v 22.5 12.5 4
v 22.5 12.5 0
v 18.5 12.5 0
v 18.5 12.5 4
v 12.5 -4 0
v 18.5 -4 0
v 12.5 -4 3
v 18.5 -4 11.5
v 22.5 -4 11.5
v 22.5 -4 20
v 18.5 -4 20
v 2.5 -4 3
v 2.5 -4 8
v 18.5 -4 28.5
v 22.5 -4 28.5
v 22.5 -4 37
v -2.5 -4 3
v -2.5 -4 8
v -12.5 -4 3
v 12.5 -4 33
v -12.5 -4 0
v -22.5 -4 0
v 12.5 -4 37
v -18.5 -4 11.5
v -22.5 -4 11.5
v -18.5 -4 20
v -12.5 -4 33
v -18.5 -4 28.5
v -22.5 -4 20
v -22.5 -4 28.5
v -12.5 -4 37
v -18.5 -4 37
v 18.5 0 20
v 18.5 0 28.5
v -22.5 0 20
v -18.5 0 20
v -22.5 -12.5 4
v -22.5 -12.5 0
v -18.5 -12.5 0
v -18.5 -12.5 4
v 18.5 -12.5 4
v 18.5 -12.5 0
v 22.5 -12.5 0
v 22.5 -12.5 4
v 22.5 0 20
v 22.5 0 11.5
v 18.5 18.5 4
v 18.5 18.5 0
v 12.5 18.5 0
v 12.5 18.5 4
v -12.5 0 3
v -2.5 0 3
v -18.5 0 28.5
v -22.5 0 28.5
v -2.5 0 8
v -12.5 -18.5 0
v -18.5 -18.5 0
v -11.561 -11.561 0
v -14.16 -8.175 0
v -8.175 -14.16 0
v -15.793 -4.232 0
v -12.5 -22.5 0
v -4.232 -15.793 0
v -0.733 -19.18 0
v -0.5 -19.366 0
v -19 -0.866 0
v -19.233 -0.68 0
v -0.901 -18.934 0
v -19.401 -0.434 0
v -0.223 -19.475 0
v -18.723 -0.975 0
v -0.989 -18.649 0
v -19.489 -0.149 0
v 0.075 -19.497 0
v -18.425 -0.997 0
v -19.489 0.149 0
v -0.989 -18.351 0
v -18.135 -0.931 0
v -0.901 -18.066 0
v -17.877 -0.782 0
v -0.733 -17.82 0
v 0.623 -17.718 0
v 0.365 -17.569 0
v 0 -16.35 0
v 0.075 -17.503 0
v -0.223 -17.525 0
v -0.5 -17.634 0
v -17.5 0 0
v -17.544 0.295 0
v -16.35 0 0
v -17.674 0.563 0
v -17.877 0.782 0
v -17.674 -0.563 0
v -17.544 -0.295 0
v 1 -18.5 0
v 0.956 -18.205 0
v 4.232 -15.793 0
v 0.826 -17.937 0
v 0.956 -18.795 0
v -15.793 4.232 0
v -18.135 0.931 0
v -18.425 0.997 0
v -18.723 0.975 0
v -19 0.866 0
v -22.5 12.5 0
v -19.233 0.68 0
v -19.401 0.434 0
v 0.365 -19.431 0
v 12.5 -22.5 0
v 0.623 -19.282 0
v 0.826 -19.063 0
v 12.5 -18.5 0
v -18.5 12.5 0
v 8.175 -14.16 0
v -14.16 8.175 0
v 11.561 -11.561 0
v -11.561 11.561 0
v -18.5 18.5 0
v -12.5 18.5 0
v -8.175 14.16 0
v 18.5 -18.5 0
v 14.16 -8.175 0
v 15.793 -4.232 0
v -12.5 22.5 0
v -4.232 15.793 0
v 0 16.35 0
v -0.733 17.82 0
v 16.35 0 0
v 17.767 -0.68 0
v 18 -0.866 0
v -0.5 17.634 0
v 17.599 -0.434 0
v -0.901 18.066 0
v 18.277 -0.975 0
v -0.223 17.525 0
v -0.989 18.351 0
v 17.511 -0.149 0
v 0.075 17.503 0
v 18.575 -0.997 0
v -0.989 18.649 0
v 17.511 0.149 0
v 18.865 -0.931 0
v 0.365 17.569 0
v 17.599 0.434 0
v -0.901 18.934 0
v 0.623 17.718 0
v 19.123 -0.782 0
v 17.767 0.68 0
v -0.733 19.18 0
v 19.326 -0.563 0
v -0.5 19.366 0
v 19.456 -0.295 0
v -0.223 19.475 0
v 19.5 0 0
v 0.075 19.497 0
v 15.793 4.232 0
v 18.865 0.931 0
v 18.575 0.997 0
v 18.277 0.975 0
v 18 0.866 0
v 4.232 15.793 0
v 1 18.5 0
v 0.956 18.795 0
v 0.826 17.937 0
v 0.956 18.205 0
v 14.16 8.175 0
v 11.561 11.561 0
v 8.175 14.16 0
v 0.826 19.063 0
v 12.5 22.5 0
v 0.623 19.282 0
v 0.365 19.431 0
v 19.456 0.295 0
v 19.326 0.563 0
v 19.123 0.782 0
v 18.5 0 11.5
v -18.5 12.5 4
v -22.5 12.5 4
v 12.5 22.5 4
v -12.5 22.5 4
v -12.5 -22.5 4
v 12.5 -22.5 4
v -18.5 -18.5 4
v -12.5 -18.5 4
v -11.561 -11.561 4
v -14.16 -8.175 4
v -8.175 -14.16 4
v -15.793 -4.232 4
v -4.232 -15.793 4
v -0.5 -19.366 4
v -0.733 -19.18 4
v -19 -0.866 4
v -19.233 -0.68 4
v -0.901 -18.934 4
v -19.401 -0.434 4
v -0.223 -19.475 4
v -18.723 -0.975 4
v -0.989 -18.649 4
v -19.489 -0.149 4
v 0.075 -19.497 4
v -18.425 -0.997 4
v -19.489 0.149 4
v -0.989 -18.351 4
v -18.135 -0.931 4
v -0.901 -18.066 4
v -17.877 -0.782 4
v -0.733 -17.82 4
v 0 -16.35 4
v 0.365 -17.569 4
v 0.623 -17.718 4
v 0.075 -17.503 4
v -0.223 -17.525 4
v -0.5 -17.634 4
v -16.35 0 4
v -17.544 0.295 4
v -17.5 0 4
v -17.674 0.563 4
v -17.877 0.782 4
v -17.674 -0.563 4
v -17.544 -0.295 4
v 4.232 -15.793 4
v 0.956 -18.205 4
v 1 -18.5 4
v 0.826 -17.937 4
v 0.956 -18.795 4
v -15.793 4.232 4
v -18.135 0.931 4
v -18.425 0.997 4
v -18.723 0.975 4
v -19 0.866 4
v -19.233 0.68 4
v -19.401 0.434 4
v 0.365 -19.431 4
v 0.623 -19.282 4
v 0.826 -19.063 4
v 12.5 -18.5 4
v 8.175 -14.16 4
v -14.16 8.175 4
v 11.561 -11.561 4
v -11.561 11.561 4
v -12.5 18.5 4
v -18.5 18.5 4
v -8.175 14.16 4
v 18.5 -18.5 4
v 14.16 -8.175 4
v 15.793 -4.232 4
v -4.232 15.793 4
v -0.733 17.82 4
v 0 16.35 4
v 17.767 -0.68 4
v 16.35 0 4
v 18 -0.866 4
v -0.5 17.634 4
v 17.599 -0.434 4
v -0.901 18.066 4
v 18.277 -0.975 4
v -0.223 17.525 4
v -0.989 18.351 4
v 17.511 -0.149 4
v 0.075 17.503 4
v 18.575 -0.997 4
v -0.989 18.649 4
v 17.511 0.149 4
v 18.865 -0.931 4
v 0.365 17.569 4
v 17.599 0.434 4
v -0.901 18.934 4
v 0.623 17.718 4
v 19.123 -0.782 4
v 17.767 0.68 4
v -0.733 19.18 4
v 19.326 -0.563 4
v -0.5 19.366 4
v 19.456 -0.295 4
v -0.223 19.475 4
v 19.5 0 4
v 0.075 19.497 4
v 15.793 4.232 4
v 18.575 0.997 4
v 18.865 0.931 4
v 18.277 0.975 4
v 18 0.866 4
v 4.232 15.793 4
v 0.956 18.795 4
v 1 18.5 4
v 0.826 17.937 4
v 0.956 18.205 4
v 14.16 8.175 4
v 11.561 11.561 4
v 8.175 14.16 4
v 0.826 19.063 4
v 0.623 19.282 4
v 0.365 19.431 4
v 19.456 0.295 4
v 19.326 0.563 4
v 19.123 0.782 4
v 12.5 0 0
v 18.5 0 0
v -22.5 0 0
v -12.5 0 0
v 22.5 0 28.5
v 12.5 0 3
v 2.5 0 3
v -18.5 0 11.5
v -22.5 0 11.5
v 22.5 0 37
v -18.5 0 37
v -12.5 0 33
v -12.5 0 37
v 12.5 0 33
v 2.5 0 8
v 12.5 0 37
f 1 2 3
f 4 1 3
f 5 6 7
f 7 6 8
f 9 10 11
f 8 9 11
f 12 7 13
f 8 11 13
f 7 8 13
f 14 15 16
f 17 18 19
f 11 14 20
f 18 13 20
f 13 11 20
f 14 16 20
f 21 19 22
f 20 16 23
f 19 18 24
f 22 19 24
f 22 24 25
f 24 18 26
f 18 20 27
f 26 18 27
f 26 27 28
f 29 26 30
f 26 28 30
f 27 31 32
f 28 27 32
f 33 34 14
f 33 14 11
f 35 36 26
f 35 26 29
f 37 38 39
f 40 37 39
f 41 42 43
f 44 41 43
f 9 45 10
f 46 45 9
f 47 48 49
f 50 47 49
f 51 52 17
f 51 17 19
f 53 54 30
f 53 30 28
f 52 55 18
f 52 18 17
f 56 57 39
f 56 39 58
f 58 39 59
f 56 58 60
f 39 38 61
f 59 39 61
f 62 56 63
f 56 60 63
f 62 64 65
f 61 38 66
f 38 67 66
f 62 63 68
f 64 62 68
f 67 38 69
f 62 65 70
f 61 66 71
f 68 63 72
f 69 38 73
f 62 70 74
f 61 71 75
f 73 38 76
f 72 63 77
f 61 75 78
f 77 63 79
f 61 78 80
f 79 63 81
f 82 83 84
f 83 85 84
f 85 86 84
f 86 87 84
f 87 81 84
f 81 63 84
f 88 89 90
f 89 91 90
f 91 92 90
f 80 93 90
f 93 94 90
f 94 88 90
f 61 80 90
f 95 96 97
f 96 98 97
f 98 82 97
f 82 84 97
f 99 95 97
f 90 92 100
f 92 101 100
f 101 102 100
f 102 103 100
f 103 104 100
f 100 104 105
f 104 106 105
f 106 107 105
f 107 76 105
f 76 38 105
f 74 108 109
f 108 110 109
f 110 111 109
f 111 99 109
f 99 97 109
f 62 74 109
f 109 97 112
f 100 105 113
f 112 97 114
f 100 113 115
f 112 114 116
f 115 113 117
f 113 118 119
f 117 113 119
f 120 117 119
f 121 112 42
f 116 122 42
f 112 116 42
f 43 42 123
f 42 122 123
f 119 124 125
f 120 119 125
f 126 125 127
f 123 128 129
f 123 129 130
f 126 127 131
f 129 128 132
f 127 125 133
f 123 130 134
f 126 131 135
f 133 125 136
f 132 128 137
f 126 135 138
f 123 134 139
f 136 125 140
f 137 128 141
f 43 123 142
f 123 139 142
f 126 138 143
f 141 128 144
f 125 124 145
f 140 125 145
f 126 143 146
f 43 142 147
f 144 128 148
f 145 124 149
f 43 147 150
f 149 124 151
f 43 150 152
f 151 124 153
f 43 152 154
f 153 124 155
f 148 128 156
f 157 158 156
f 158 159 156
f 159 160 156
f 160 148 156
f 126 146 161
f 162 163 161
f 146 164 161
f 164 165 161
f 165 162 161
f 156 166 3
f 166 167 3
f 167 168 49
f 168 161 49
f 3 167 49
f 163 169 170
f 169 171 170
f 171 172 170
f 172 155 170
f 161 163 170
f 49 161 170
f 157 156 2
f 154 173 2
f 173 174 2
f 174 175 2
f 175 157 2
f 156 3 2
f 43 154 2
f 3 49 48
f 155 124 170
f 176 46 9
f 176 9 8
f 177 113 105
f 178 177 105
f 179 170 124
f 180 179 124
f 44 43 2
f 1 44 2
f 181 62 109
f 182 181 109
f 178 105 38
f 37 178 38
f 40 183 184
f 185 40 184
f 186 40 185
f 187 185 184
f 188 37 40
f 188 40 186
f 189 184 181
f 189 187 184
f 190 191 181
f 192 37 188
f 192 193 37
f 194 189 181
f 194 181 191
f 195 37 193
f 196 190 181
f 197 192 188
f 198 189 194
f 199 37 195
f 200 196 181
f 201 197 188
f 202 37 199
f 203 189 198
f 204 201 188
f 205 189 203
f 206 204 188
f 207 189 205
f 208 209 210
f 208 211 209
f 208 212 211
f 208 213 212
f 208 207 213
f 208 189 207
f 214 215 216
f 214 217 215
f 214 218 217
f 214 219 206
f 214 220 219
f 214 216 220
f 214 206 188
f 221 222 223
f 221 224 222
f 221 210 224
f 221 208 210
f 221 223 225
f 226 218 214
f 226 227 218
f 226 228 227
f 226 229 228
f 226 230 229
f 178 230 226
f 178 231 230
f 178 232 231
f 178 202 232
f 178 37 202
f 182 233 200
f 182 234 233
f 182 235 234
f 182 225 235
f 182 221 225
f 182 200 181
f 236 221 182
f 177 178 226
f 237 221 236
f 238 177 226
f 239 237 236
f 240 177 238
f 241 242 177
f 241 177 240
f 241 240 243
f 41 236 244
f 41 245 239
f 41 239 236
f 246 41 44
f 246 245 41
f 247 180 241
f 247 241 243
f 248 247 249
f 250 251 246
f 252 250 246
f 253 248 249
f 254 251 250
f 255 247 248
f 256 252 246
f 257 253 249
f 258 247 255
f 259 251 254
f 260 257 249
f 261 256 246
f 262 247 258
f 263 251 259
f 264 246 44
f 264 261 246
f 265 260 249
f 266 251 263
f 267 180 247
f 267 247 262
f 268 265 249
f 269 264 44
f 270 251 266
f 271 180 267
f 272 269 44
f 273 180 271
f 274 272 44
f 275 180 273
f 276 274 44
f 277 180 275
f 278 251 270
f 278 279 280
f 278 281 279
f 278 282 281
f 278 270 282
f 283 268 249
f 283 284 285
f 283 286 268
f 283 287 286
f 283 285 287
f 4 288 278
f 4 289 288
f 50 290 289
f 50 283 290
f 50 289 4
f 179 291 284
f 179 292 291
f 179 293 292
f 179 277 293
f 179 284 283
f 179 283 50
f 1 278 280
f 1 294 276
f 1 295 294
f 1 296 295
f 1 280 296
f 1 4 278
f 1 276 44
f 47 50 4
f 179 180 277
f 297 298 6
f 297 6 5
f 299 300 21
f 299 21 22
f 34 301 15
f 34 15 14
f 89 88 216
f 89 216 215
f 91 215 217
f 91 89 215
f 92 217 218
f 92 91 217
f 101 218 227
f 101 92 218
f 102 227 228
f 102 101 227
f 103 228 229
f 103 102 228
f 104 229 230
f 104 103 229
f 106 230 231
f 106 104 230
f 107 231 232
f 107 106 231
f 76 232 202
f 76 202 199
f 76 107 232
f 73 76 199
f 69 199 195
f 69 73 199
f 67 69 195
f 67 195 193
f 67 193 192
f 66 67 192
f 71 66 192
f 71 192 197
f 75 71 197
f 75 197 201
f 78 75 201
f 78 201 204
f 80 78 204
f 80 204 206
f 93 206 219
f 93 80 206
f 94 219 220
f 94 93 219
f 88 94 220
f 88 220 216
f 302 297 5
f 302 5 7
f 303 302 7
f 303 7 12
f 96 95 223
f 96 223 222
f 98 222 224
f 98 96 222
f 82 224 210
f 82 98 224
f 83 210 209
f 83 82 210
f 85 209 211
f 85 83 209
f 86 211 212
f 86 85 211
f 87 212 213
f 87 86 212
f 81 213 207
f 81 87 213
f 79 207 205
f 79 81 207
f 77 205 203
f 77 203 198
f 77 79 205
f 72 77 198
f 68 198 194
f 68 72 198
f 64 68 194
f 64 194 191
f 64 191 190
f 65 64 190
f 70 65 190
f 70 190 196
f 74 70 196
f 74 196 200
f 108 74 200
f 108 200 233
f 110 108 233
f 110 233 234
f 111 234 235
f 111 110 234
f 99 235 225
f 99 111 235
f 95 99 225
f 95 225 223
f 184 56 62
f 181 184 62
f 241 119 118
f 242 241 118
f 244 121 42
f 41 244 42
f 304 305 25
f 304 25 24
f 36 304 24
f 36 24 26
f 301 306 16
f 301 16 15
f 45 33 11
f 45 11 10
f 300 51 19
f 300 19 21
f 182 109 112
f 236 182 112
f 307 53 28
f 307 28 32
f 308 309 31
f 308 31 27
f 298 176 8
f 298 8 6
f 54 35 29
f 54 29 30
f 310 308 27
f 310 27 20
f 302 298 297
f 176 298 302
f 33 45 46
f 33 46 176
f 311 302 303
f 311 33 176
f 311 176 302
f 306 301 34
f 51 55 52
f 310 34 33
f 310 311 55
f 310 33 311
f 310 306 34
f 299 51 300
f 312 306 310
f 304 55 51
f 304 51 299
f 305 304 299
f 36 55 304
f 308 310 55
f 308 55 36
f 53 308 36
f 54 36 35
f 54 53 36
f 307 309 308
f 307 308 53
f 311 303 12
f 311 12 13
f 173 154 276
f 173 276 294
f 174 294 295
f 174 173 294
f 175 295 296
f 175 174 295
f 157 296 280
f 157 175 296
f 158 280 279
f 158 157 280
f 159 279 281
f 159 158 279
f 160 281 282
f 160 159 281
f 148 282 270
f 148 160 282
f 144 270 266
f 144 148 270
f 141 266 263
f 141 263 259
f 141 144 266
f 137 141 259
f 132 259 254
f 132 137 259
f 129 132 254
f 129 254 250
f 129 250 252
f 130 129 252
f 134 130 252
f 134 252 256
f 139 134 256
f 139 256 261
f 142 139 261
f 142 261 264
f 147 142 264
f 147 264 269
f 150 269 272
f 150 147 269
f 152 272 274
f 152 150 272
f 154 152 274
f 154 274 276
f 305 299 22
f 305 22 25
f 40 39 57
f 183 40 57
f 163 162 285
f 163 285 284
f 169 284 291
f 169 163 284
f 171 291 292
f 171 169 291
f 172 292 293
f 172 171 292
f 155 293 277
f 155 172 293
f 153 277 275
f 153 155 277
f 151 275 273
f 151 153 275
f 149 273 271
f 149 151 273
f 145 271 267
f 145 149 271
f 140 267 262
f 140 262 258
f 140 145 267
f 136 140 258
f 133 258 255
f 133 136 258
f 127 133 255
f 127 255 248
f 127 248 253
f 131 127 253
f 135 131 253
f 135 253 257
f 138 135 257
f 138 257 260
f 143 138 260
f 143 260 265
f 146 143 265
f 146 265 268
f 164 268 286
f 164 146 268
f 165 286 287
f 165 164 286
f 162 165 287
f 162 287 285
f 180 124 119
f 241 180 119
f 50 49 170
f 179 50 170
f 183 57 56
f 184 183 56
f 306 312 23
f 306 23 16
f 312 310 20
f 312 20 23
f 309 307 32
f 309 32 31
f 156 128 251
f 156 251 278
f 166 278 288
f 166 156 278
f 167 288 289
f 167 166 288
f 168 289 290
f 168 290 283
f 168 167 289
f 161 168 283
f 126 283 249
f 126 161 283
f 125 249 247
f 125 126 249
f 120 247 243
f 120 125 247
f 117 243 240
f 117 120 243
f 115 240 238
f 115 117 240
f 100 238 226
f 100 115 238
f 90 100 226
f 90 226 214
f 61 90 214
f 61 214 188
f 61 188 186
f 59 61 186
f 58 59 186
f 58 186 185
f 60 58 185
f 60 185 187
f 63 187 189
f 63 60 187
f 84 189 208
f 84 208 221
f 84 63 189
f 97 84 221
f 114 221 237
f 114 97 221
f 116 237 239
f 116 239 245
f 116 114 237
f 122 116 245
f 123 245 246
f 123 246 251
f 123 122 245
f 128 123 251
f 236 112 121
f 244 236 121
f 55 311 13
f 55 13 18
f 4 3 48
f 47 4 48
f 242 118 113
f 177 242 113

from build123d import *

# Parameters (mm, degrees)
SKETCH_R     = 16.35
SKETCH_R_2   = 1
PAD001_DEPTH = 4
PAD_DEPTH    = 4


with BuildPart() as cover:
    # Sketch → Pad001 (new body)
    with BuildSketch(Plane.XY):
        Polygon((-22.5, 12.5), (-22.5, -12.5), (-18.5, -12.5), (-18.5, -18.5), (-12.5, -18.5), (-12.5, -22.5), (12.5, -22.5), (12.5, -18.5), (18.5, -18.5), (18.5, -12.5), (22.5, -12.5), (22.5, 12.5), (18.5, 12.5), (18.5, 18.5), (12.5, 18.5), (12.5, 22.5), (-12.5, 22.5), (-12.5, 18.5), (-18.5, 18.5), (-18.5, 12.5), align=None)
        Circle(SKETCH_R, mode=Mode.SUBTRACT)
        with Locations((0, 18.5)):
            Circle(SKETCH_R_2, mode=Mode.SUBTRACT)
        with Locations((18.5, 0)):
            Circle(SKETCH_R_2, mode=Mode.SUBTRACT)
        with Locations((-18.5, 0)):
            Circle(SKETCH_R_2, mode=Mode.SUBTRACT)
        with Locations((0, -18.5)):
            Circle(SKETCH_R_2, mode=Mode.SUBTRACT)
    extrude(amount=PAD001_DEPTH)


with BuildPart() as walls:
    # Sketch001 → Pad (new body)
    with BuildSketch(Plane.XZ):
        Polygon((-18.5, 37), (-12.5, 37), (-12.5, 33), (12.5, 33), (12.5, 37), (22.5, 37), (22.5, 28.5), (18.5, 28.5), (18.5, 20), (22.5, 20), (22.5, 11.5), (18.5, 11.5), (18.5, 0), (12.5, 0), (12.5, 3), (2.5, 3), (2.5, 8), (-2.5, 8), (-2.5, 3), (-12.5, 3), (-12.5, 0), (-22.5, 0), (-22.5, 11.5), (-18.5, 11.5), (-18.5, 20), (-22.5, 20), (-22.5, 28.5), (-18.5, 28.5), align=None)
    extrude(amount=PAD_DEPTH)


solid = Compound([cover.part, walls.part])
